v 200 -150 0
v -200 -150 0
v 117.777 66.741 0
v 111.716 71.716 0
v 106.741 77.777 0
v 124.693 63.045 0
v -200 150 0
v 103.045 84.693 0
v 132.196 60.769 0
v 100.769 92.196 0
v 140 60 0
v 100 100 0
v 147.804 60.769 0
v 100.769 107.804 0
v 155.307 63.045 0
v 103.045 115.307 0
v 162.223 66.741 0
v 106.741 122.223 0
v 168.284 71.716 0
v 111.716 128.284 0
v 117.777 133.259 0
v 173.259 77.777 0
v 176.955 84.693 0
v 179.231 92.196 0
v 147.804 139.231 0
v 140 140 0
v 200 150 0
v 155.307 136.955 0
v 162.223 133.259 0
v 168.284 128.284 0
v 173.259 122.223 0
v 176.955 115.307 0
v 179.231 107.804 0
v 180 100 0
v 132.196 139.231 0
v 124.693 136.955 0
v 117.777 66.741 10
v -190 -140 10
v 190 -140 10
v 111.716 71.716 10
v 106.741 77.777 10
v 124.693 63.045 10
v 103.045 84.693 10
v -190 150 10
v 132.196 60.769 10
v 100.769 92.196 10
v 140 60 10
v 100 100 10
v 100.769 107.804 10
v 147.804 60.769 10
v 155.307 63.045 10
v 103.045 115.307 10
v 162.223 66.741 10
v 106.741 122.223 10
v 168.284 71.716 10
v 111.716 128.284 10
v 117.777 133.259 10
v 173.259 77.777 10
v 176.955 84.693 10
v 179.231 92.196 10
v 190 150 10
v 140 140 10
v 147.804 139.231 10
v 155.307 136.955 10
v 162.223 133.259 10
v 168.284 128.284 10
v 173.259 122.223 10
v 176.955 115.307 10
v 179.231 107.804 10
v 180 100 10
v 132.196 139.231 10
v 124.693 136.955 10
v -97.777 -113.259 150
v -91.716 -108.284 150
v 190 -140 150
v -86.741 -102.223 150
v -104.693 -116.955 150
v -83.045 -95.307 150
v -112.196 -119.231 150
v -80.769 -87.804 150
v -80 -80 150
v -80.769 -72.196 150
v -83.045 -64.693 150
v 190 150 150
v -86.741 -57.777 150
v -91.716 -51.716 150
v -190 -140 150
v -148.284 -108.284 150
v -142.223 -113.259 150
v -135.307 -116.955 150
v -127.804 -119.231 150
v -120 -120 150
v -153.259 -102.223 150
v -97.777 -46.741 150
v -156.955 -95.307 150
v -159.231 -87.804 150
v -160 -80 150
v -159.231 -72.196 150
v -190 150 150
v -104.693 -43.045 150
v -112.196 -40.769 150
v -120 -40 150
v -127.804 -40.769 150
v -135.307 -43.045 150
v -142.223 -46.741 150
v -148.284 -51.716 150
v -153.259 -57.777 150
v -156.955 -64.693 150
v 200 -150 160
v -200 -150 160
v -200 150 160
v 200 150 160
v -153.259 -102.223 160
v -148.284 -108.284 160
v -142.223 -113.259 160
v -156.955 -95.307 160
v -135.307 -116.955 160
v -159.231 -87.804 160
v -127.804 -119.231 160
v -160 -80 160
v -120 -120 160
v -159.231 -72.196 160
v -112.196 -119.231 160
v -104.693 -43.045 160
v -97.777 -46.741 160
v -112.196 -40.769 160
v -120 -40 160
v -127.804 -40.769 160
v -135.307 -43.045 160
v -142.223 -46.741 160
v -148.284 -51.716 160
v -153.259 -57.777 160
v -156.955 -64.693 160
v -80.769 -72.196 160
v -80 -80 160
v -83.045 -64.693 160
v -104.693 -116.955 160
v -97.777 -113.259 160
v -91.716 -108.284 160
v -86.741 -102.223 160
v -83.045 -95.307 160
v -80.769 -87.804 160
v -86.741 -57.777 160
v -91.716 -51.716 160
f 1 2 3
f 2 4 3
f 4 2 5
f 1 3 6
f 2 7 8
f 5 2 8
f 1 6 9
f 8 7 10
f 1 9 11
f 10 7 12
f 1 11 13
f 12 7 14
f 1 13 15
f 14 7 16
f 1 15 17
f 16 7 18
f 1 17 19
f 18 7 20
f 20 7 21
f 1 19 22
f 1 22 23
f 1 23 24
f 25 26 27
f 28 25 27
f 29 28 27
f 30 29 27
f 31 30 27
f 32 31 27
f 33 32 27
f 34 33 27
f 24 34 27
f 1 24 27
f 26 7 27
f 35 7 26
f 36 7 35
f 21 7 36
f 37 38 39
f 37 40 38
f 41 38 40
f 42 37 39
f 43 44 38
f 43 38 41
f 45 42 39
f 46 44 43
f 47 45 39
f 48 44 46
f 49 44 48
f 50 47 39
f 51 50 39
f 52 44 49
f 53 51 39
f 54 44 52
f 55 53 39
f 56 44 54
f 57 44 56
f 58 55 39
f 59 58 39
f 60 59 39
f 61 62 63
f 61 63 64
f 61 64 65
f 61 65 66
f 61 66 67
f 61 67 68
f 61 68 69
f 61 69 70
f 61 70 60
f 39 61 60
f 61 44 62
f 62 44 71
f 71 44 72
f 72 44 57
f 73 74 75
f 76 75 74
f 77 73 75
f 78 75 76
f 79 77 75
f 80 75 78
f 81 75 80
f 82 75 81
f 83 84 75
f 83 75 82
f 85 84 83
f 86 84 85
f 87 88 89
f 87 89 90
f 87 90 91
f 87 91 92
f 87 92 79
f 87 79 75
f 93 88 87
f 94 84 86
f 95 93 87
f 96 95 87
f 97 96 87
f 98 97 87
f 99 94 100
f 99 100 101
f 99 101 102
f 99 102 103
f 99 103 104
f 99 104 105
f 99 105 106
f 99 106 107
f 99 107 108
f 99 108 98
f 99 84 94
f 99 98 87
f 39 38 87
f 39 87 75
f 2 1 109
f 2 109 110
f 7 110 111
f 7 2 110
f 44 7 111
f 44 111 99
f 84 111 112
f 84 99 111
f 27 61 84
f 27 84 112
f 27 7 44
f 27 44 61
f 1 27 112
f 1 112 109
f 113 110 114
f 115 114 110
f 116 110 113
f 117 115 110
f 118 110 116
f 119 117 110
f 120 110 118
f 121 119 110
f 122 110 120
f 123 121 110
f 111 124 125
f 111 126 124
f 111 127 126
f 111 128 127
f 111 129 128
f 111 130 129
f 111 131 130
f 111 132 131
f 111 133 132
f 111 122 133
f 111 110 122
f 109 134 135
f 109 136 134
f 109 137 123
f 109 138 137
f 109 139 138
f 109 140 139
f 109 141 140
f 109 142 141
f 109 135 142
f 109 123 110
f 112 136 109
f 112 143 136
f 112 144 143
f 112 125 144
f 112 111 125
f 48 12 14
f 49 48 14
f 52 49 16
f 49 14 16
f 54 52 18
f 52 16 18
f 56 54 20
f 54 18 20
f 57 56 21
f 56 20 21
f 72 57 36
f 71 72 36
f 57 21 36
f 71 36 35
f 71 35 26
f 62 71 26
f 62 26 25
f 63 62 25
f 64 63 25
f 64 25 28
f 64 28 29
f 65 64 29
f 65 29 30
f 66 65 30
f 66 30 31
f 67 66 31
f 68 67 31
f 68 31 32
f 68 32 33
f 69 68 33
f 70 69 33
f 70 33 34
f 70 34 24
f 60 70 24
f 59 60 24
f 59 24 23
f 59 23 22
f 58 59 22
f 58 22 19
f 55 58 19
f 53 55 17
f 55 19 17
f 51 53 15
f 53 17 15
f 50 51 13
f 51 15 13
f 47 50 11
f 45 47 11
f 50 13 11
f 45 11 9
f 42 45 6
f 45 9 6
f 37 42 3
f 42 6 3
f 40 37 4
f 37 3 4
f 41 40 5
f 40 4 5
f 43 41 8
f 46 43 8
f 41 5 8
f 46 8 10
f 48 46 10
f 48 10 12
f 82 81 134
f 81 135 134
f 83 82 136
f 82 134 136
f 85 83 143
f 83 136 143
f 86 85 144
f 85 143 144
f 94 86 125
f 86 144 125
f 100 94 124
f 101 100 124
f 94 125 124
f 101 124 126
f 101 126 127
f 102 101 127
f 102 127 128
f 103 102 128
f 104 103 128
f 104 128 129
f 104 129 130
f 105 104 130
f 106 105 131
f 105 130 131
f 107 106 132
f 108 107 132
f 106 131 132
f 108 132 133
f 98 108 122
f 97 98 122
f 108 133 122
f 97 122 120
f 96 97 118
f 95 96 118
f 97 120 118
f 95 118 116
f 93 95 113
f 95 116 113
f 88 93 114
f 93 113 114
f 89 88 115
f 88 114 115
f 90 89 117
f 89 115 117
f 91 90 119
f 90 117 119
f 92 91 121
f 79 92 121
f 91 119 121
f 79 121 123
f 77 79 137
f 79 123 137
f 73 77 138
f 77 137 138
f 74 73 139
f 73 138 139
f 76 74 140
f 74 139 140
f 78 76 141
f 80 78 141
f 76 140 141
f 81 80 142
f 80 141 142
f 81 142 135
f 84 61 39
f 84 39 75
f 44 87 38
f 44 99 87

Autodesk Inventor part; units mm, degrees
ref_plane "YZ Plane" through (0, 0, 0) normal (1, 0, 0) x (0, 1, 0)
ref_plane "XZ Plane" through (0, 0, 0) normal (0, 1, 0) x (-1, 0, 0)
ref_plane "XY Plane" through (0, 0, 0) normal (0, 0, 1) x (1, 0, 0)
sketch "Boceto1" plane through (0, 0, 0) normal (0, 0, 1) x (1, 0, 0)
  line L0 (-200, 150) -> (200, 150)
  line L1 (200, 150) -> (200, -150)
  line L2 (200, -150) -> (-200, -150)
  line L3 (-200, -150) -> (-200, 150)
  point P0 (0, 0)
  point P1 (0, 150)
  point P2 (-200, 0)
  dimension "d0" = 400
  dimension "d1" = 300
extrude "Extrusión1" add sketch "Boceto1" along normal blind 160
sketch "Boceto2" plane through (-200, 150, 0) normal (0, 1, 0) x (1, 0, 0)
  line L0 (400, 0) -> (0, 0) construction
  line L1 (0, 0) -> (0, -160) construction
  line L2 (400, -160) -> (0, -160) construction
  line L3 (400, 0) -> (400, -160) construction
  line L4 (10, -150) -> (10, -10)
  line L5 (10, -10) -> (390, -10)
  line L6 (390, -10) -> (390, -150)
  line L7 (390, -150) -> (10, -150)
  point P0 (200, 0)
  dimension "d4" = 10
extrude "Extrusión2" cut sketch "Boceto2" against normal blind 290
sketch "Boceto3" plane through (0, 0, 160) normal (0, 0, 1) x (1, 0, 0)
  line L0 (-200, -150) -> (200, -150) construction
  line L1 (200, -150) -> (200, 150) construction
  line L2 (200, 150) -> (-200, 150) construction
  line L3 (-200, 150) -> (-200, -150) construction
  circle A0 centre (-120, -80) radius 40
  point P0 (0, 0)
  dimension "d7" = 80
  dimension "d8" = 80
  dimension "d9" = 70
extrude "Extrusión3" cut sketch "Boceto3" against normal blind 10
sketch "Boceto4" plane through (0, 0, 0) normal (0, 0, -1) x (-1, 0, 0)
  circle A0 centre (-140, 100) radius 40
  line L0 (200, -150) -> (-200, -150) construction
  line L1 (200, 150) -> (200, -150) construction
  line L2 (-200, 150) -> (200, 150) construction
  line L3 (-200, -150) -> (-200, 150) construction
  point P0 (0, 0)
  dimension "d12" = 80
  dimension "d13" = 50
  dimension "d14" = 60
extrude "Extrusión4" cut sketch "Boceto4" against normal blind 10
properties part number "caja de cambios"
